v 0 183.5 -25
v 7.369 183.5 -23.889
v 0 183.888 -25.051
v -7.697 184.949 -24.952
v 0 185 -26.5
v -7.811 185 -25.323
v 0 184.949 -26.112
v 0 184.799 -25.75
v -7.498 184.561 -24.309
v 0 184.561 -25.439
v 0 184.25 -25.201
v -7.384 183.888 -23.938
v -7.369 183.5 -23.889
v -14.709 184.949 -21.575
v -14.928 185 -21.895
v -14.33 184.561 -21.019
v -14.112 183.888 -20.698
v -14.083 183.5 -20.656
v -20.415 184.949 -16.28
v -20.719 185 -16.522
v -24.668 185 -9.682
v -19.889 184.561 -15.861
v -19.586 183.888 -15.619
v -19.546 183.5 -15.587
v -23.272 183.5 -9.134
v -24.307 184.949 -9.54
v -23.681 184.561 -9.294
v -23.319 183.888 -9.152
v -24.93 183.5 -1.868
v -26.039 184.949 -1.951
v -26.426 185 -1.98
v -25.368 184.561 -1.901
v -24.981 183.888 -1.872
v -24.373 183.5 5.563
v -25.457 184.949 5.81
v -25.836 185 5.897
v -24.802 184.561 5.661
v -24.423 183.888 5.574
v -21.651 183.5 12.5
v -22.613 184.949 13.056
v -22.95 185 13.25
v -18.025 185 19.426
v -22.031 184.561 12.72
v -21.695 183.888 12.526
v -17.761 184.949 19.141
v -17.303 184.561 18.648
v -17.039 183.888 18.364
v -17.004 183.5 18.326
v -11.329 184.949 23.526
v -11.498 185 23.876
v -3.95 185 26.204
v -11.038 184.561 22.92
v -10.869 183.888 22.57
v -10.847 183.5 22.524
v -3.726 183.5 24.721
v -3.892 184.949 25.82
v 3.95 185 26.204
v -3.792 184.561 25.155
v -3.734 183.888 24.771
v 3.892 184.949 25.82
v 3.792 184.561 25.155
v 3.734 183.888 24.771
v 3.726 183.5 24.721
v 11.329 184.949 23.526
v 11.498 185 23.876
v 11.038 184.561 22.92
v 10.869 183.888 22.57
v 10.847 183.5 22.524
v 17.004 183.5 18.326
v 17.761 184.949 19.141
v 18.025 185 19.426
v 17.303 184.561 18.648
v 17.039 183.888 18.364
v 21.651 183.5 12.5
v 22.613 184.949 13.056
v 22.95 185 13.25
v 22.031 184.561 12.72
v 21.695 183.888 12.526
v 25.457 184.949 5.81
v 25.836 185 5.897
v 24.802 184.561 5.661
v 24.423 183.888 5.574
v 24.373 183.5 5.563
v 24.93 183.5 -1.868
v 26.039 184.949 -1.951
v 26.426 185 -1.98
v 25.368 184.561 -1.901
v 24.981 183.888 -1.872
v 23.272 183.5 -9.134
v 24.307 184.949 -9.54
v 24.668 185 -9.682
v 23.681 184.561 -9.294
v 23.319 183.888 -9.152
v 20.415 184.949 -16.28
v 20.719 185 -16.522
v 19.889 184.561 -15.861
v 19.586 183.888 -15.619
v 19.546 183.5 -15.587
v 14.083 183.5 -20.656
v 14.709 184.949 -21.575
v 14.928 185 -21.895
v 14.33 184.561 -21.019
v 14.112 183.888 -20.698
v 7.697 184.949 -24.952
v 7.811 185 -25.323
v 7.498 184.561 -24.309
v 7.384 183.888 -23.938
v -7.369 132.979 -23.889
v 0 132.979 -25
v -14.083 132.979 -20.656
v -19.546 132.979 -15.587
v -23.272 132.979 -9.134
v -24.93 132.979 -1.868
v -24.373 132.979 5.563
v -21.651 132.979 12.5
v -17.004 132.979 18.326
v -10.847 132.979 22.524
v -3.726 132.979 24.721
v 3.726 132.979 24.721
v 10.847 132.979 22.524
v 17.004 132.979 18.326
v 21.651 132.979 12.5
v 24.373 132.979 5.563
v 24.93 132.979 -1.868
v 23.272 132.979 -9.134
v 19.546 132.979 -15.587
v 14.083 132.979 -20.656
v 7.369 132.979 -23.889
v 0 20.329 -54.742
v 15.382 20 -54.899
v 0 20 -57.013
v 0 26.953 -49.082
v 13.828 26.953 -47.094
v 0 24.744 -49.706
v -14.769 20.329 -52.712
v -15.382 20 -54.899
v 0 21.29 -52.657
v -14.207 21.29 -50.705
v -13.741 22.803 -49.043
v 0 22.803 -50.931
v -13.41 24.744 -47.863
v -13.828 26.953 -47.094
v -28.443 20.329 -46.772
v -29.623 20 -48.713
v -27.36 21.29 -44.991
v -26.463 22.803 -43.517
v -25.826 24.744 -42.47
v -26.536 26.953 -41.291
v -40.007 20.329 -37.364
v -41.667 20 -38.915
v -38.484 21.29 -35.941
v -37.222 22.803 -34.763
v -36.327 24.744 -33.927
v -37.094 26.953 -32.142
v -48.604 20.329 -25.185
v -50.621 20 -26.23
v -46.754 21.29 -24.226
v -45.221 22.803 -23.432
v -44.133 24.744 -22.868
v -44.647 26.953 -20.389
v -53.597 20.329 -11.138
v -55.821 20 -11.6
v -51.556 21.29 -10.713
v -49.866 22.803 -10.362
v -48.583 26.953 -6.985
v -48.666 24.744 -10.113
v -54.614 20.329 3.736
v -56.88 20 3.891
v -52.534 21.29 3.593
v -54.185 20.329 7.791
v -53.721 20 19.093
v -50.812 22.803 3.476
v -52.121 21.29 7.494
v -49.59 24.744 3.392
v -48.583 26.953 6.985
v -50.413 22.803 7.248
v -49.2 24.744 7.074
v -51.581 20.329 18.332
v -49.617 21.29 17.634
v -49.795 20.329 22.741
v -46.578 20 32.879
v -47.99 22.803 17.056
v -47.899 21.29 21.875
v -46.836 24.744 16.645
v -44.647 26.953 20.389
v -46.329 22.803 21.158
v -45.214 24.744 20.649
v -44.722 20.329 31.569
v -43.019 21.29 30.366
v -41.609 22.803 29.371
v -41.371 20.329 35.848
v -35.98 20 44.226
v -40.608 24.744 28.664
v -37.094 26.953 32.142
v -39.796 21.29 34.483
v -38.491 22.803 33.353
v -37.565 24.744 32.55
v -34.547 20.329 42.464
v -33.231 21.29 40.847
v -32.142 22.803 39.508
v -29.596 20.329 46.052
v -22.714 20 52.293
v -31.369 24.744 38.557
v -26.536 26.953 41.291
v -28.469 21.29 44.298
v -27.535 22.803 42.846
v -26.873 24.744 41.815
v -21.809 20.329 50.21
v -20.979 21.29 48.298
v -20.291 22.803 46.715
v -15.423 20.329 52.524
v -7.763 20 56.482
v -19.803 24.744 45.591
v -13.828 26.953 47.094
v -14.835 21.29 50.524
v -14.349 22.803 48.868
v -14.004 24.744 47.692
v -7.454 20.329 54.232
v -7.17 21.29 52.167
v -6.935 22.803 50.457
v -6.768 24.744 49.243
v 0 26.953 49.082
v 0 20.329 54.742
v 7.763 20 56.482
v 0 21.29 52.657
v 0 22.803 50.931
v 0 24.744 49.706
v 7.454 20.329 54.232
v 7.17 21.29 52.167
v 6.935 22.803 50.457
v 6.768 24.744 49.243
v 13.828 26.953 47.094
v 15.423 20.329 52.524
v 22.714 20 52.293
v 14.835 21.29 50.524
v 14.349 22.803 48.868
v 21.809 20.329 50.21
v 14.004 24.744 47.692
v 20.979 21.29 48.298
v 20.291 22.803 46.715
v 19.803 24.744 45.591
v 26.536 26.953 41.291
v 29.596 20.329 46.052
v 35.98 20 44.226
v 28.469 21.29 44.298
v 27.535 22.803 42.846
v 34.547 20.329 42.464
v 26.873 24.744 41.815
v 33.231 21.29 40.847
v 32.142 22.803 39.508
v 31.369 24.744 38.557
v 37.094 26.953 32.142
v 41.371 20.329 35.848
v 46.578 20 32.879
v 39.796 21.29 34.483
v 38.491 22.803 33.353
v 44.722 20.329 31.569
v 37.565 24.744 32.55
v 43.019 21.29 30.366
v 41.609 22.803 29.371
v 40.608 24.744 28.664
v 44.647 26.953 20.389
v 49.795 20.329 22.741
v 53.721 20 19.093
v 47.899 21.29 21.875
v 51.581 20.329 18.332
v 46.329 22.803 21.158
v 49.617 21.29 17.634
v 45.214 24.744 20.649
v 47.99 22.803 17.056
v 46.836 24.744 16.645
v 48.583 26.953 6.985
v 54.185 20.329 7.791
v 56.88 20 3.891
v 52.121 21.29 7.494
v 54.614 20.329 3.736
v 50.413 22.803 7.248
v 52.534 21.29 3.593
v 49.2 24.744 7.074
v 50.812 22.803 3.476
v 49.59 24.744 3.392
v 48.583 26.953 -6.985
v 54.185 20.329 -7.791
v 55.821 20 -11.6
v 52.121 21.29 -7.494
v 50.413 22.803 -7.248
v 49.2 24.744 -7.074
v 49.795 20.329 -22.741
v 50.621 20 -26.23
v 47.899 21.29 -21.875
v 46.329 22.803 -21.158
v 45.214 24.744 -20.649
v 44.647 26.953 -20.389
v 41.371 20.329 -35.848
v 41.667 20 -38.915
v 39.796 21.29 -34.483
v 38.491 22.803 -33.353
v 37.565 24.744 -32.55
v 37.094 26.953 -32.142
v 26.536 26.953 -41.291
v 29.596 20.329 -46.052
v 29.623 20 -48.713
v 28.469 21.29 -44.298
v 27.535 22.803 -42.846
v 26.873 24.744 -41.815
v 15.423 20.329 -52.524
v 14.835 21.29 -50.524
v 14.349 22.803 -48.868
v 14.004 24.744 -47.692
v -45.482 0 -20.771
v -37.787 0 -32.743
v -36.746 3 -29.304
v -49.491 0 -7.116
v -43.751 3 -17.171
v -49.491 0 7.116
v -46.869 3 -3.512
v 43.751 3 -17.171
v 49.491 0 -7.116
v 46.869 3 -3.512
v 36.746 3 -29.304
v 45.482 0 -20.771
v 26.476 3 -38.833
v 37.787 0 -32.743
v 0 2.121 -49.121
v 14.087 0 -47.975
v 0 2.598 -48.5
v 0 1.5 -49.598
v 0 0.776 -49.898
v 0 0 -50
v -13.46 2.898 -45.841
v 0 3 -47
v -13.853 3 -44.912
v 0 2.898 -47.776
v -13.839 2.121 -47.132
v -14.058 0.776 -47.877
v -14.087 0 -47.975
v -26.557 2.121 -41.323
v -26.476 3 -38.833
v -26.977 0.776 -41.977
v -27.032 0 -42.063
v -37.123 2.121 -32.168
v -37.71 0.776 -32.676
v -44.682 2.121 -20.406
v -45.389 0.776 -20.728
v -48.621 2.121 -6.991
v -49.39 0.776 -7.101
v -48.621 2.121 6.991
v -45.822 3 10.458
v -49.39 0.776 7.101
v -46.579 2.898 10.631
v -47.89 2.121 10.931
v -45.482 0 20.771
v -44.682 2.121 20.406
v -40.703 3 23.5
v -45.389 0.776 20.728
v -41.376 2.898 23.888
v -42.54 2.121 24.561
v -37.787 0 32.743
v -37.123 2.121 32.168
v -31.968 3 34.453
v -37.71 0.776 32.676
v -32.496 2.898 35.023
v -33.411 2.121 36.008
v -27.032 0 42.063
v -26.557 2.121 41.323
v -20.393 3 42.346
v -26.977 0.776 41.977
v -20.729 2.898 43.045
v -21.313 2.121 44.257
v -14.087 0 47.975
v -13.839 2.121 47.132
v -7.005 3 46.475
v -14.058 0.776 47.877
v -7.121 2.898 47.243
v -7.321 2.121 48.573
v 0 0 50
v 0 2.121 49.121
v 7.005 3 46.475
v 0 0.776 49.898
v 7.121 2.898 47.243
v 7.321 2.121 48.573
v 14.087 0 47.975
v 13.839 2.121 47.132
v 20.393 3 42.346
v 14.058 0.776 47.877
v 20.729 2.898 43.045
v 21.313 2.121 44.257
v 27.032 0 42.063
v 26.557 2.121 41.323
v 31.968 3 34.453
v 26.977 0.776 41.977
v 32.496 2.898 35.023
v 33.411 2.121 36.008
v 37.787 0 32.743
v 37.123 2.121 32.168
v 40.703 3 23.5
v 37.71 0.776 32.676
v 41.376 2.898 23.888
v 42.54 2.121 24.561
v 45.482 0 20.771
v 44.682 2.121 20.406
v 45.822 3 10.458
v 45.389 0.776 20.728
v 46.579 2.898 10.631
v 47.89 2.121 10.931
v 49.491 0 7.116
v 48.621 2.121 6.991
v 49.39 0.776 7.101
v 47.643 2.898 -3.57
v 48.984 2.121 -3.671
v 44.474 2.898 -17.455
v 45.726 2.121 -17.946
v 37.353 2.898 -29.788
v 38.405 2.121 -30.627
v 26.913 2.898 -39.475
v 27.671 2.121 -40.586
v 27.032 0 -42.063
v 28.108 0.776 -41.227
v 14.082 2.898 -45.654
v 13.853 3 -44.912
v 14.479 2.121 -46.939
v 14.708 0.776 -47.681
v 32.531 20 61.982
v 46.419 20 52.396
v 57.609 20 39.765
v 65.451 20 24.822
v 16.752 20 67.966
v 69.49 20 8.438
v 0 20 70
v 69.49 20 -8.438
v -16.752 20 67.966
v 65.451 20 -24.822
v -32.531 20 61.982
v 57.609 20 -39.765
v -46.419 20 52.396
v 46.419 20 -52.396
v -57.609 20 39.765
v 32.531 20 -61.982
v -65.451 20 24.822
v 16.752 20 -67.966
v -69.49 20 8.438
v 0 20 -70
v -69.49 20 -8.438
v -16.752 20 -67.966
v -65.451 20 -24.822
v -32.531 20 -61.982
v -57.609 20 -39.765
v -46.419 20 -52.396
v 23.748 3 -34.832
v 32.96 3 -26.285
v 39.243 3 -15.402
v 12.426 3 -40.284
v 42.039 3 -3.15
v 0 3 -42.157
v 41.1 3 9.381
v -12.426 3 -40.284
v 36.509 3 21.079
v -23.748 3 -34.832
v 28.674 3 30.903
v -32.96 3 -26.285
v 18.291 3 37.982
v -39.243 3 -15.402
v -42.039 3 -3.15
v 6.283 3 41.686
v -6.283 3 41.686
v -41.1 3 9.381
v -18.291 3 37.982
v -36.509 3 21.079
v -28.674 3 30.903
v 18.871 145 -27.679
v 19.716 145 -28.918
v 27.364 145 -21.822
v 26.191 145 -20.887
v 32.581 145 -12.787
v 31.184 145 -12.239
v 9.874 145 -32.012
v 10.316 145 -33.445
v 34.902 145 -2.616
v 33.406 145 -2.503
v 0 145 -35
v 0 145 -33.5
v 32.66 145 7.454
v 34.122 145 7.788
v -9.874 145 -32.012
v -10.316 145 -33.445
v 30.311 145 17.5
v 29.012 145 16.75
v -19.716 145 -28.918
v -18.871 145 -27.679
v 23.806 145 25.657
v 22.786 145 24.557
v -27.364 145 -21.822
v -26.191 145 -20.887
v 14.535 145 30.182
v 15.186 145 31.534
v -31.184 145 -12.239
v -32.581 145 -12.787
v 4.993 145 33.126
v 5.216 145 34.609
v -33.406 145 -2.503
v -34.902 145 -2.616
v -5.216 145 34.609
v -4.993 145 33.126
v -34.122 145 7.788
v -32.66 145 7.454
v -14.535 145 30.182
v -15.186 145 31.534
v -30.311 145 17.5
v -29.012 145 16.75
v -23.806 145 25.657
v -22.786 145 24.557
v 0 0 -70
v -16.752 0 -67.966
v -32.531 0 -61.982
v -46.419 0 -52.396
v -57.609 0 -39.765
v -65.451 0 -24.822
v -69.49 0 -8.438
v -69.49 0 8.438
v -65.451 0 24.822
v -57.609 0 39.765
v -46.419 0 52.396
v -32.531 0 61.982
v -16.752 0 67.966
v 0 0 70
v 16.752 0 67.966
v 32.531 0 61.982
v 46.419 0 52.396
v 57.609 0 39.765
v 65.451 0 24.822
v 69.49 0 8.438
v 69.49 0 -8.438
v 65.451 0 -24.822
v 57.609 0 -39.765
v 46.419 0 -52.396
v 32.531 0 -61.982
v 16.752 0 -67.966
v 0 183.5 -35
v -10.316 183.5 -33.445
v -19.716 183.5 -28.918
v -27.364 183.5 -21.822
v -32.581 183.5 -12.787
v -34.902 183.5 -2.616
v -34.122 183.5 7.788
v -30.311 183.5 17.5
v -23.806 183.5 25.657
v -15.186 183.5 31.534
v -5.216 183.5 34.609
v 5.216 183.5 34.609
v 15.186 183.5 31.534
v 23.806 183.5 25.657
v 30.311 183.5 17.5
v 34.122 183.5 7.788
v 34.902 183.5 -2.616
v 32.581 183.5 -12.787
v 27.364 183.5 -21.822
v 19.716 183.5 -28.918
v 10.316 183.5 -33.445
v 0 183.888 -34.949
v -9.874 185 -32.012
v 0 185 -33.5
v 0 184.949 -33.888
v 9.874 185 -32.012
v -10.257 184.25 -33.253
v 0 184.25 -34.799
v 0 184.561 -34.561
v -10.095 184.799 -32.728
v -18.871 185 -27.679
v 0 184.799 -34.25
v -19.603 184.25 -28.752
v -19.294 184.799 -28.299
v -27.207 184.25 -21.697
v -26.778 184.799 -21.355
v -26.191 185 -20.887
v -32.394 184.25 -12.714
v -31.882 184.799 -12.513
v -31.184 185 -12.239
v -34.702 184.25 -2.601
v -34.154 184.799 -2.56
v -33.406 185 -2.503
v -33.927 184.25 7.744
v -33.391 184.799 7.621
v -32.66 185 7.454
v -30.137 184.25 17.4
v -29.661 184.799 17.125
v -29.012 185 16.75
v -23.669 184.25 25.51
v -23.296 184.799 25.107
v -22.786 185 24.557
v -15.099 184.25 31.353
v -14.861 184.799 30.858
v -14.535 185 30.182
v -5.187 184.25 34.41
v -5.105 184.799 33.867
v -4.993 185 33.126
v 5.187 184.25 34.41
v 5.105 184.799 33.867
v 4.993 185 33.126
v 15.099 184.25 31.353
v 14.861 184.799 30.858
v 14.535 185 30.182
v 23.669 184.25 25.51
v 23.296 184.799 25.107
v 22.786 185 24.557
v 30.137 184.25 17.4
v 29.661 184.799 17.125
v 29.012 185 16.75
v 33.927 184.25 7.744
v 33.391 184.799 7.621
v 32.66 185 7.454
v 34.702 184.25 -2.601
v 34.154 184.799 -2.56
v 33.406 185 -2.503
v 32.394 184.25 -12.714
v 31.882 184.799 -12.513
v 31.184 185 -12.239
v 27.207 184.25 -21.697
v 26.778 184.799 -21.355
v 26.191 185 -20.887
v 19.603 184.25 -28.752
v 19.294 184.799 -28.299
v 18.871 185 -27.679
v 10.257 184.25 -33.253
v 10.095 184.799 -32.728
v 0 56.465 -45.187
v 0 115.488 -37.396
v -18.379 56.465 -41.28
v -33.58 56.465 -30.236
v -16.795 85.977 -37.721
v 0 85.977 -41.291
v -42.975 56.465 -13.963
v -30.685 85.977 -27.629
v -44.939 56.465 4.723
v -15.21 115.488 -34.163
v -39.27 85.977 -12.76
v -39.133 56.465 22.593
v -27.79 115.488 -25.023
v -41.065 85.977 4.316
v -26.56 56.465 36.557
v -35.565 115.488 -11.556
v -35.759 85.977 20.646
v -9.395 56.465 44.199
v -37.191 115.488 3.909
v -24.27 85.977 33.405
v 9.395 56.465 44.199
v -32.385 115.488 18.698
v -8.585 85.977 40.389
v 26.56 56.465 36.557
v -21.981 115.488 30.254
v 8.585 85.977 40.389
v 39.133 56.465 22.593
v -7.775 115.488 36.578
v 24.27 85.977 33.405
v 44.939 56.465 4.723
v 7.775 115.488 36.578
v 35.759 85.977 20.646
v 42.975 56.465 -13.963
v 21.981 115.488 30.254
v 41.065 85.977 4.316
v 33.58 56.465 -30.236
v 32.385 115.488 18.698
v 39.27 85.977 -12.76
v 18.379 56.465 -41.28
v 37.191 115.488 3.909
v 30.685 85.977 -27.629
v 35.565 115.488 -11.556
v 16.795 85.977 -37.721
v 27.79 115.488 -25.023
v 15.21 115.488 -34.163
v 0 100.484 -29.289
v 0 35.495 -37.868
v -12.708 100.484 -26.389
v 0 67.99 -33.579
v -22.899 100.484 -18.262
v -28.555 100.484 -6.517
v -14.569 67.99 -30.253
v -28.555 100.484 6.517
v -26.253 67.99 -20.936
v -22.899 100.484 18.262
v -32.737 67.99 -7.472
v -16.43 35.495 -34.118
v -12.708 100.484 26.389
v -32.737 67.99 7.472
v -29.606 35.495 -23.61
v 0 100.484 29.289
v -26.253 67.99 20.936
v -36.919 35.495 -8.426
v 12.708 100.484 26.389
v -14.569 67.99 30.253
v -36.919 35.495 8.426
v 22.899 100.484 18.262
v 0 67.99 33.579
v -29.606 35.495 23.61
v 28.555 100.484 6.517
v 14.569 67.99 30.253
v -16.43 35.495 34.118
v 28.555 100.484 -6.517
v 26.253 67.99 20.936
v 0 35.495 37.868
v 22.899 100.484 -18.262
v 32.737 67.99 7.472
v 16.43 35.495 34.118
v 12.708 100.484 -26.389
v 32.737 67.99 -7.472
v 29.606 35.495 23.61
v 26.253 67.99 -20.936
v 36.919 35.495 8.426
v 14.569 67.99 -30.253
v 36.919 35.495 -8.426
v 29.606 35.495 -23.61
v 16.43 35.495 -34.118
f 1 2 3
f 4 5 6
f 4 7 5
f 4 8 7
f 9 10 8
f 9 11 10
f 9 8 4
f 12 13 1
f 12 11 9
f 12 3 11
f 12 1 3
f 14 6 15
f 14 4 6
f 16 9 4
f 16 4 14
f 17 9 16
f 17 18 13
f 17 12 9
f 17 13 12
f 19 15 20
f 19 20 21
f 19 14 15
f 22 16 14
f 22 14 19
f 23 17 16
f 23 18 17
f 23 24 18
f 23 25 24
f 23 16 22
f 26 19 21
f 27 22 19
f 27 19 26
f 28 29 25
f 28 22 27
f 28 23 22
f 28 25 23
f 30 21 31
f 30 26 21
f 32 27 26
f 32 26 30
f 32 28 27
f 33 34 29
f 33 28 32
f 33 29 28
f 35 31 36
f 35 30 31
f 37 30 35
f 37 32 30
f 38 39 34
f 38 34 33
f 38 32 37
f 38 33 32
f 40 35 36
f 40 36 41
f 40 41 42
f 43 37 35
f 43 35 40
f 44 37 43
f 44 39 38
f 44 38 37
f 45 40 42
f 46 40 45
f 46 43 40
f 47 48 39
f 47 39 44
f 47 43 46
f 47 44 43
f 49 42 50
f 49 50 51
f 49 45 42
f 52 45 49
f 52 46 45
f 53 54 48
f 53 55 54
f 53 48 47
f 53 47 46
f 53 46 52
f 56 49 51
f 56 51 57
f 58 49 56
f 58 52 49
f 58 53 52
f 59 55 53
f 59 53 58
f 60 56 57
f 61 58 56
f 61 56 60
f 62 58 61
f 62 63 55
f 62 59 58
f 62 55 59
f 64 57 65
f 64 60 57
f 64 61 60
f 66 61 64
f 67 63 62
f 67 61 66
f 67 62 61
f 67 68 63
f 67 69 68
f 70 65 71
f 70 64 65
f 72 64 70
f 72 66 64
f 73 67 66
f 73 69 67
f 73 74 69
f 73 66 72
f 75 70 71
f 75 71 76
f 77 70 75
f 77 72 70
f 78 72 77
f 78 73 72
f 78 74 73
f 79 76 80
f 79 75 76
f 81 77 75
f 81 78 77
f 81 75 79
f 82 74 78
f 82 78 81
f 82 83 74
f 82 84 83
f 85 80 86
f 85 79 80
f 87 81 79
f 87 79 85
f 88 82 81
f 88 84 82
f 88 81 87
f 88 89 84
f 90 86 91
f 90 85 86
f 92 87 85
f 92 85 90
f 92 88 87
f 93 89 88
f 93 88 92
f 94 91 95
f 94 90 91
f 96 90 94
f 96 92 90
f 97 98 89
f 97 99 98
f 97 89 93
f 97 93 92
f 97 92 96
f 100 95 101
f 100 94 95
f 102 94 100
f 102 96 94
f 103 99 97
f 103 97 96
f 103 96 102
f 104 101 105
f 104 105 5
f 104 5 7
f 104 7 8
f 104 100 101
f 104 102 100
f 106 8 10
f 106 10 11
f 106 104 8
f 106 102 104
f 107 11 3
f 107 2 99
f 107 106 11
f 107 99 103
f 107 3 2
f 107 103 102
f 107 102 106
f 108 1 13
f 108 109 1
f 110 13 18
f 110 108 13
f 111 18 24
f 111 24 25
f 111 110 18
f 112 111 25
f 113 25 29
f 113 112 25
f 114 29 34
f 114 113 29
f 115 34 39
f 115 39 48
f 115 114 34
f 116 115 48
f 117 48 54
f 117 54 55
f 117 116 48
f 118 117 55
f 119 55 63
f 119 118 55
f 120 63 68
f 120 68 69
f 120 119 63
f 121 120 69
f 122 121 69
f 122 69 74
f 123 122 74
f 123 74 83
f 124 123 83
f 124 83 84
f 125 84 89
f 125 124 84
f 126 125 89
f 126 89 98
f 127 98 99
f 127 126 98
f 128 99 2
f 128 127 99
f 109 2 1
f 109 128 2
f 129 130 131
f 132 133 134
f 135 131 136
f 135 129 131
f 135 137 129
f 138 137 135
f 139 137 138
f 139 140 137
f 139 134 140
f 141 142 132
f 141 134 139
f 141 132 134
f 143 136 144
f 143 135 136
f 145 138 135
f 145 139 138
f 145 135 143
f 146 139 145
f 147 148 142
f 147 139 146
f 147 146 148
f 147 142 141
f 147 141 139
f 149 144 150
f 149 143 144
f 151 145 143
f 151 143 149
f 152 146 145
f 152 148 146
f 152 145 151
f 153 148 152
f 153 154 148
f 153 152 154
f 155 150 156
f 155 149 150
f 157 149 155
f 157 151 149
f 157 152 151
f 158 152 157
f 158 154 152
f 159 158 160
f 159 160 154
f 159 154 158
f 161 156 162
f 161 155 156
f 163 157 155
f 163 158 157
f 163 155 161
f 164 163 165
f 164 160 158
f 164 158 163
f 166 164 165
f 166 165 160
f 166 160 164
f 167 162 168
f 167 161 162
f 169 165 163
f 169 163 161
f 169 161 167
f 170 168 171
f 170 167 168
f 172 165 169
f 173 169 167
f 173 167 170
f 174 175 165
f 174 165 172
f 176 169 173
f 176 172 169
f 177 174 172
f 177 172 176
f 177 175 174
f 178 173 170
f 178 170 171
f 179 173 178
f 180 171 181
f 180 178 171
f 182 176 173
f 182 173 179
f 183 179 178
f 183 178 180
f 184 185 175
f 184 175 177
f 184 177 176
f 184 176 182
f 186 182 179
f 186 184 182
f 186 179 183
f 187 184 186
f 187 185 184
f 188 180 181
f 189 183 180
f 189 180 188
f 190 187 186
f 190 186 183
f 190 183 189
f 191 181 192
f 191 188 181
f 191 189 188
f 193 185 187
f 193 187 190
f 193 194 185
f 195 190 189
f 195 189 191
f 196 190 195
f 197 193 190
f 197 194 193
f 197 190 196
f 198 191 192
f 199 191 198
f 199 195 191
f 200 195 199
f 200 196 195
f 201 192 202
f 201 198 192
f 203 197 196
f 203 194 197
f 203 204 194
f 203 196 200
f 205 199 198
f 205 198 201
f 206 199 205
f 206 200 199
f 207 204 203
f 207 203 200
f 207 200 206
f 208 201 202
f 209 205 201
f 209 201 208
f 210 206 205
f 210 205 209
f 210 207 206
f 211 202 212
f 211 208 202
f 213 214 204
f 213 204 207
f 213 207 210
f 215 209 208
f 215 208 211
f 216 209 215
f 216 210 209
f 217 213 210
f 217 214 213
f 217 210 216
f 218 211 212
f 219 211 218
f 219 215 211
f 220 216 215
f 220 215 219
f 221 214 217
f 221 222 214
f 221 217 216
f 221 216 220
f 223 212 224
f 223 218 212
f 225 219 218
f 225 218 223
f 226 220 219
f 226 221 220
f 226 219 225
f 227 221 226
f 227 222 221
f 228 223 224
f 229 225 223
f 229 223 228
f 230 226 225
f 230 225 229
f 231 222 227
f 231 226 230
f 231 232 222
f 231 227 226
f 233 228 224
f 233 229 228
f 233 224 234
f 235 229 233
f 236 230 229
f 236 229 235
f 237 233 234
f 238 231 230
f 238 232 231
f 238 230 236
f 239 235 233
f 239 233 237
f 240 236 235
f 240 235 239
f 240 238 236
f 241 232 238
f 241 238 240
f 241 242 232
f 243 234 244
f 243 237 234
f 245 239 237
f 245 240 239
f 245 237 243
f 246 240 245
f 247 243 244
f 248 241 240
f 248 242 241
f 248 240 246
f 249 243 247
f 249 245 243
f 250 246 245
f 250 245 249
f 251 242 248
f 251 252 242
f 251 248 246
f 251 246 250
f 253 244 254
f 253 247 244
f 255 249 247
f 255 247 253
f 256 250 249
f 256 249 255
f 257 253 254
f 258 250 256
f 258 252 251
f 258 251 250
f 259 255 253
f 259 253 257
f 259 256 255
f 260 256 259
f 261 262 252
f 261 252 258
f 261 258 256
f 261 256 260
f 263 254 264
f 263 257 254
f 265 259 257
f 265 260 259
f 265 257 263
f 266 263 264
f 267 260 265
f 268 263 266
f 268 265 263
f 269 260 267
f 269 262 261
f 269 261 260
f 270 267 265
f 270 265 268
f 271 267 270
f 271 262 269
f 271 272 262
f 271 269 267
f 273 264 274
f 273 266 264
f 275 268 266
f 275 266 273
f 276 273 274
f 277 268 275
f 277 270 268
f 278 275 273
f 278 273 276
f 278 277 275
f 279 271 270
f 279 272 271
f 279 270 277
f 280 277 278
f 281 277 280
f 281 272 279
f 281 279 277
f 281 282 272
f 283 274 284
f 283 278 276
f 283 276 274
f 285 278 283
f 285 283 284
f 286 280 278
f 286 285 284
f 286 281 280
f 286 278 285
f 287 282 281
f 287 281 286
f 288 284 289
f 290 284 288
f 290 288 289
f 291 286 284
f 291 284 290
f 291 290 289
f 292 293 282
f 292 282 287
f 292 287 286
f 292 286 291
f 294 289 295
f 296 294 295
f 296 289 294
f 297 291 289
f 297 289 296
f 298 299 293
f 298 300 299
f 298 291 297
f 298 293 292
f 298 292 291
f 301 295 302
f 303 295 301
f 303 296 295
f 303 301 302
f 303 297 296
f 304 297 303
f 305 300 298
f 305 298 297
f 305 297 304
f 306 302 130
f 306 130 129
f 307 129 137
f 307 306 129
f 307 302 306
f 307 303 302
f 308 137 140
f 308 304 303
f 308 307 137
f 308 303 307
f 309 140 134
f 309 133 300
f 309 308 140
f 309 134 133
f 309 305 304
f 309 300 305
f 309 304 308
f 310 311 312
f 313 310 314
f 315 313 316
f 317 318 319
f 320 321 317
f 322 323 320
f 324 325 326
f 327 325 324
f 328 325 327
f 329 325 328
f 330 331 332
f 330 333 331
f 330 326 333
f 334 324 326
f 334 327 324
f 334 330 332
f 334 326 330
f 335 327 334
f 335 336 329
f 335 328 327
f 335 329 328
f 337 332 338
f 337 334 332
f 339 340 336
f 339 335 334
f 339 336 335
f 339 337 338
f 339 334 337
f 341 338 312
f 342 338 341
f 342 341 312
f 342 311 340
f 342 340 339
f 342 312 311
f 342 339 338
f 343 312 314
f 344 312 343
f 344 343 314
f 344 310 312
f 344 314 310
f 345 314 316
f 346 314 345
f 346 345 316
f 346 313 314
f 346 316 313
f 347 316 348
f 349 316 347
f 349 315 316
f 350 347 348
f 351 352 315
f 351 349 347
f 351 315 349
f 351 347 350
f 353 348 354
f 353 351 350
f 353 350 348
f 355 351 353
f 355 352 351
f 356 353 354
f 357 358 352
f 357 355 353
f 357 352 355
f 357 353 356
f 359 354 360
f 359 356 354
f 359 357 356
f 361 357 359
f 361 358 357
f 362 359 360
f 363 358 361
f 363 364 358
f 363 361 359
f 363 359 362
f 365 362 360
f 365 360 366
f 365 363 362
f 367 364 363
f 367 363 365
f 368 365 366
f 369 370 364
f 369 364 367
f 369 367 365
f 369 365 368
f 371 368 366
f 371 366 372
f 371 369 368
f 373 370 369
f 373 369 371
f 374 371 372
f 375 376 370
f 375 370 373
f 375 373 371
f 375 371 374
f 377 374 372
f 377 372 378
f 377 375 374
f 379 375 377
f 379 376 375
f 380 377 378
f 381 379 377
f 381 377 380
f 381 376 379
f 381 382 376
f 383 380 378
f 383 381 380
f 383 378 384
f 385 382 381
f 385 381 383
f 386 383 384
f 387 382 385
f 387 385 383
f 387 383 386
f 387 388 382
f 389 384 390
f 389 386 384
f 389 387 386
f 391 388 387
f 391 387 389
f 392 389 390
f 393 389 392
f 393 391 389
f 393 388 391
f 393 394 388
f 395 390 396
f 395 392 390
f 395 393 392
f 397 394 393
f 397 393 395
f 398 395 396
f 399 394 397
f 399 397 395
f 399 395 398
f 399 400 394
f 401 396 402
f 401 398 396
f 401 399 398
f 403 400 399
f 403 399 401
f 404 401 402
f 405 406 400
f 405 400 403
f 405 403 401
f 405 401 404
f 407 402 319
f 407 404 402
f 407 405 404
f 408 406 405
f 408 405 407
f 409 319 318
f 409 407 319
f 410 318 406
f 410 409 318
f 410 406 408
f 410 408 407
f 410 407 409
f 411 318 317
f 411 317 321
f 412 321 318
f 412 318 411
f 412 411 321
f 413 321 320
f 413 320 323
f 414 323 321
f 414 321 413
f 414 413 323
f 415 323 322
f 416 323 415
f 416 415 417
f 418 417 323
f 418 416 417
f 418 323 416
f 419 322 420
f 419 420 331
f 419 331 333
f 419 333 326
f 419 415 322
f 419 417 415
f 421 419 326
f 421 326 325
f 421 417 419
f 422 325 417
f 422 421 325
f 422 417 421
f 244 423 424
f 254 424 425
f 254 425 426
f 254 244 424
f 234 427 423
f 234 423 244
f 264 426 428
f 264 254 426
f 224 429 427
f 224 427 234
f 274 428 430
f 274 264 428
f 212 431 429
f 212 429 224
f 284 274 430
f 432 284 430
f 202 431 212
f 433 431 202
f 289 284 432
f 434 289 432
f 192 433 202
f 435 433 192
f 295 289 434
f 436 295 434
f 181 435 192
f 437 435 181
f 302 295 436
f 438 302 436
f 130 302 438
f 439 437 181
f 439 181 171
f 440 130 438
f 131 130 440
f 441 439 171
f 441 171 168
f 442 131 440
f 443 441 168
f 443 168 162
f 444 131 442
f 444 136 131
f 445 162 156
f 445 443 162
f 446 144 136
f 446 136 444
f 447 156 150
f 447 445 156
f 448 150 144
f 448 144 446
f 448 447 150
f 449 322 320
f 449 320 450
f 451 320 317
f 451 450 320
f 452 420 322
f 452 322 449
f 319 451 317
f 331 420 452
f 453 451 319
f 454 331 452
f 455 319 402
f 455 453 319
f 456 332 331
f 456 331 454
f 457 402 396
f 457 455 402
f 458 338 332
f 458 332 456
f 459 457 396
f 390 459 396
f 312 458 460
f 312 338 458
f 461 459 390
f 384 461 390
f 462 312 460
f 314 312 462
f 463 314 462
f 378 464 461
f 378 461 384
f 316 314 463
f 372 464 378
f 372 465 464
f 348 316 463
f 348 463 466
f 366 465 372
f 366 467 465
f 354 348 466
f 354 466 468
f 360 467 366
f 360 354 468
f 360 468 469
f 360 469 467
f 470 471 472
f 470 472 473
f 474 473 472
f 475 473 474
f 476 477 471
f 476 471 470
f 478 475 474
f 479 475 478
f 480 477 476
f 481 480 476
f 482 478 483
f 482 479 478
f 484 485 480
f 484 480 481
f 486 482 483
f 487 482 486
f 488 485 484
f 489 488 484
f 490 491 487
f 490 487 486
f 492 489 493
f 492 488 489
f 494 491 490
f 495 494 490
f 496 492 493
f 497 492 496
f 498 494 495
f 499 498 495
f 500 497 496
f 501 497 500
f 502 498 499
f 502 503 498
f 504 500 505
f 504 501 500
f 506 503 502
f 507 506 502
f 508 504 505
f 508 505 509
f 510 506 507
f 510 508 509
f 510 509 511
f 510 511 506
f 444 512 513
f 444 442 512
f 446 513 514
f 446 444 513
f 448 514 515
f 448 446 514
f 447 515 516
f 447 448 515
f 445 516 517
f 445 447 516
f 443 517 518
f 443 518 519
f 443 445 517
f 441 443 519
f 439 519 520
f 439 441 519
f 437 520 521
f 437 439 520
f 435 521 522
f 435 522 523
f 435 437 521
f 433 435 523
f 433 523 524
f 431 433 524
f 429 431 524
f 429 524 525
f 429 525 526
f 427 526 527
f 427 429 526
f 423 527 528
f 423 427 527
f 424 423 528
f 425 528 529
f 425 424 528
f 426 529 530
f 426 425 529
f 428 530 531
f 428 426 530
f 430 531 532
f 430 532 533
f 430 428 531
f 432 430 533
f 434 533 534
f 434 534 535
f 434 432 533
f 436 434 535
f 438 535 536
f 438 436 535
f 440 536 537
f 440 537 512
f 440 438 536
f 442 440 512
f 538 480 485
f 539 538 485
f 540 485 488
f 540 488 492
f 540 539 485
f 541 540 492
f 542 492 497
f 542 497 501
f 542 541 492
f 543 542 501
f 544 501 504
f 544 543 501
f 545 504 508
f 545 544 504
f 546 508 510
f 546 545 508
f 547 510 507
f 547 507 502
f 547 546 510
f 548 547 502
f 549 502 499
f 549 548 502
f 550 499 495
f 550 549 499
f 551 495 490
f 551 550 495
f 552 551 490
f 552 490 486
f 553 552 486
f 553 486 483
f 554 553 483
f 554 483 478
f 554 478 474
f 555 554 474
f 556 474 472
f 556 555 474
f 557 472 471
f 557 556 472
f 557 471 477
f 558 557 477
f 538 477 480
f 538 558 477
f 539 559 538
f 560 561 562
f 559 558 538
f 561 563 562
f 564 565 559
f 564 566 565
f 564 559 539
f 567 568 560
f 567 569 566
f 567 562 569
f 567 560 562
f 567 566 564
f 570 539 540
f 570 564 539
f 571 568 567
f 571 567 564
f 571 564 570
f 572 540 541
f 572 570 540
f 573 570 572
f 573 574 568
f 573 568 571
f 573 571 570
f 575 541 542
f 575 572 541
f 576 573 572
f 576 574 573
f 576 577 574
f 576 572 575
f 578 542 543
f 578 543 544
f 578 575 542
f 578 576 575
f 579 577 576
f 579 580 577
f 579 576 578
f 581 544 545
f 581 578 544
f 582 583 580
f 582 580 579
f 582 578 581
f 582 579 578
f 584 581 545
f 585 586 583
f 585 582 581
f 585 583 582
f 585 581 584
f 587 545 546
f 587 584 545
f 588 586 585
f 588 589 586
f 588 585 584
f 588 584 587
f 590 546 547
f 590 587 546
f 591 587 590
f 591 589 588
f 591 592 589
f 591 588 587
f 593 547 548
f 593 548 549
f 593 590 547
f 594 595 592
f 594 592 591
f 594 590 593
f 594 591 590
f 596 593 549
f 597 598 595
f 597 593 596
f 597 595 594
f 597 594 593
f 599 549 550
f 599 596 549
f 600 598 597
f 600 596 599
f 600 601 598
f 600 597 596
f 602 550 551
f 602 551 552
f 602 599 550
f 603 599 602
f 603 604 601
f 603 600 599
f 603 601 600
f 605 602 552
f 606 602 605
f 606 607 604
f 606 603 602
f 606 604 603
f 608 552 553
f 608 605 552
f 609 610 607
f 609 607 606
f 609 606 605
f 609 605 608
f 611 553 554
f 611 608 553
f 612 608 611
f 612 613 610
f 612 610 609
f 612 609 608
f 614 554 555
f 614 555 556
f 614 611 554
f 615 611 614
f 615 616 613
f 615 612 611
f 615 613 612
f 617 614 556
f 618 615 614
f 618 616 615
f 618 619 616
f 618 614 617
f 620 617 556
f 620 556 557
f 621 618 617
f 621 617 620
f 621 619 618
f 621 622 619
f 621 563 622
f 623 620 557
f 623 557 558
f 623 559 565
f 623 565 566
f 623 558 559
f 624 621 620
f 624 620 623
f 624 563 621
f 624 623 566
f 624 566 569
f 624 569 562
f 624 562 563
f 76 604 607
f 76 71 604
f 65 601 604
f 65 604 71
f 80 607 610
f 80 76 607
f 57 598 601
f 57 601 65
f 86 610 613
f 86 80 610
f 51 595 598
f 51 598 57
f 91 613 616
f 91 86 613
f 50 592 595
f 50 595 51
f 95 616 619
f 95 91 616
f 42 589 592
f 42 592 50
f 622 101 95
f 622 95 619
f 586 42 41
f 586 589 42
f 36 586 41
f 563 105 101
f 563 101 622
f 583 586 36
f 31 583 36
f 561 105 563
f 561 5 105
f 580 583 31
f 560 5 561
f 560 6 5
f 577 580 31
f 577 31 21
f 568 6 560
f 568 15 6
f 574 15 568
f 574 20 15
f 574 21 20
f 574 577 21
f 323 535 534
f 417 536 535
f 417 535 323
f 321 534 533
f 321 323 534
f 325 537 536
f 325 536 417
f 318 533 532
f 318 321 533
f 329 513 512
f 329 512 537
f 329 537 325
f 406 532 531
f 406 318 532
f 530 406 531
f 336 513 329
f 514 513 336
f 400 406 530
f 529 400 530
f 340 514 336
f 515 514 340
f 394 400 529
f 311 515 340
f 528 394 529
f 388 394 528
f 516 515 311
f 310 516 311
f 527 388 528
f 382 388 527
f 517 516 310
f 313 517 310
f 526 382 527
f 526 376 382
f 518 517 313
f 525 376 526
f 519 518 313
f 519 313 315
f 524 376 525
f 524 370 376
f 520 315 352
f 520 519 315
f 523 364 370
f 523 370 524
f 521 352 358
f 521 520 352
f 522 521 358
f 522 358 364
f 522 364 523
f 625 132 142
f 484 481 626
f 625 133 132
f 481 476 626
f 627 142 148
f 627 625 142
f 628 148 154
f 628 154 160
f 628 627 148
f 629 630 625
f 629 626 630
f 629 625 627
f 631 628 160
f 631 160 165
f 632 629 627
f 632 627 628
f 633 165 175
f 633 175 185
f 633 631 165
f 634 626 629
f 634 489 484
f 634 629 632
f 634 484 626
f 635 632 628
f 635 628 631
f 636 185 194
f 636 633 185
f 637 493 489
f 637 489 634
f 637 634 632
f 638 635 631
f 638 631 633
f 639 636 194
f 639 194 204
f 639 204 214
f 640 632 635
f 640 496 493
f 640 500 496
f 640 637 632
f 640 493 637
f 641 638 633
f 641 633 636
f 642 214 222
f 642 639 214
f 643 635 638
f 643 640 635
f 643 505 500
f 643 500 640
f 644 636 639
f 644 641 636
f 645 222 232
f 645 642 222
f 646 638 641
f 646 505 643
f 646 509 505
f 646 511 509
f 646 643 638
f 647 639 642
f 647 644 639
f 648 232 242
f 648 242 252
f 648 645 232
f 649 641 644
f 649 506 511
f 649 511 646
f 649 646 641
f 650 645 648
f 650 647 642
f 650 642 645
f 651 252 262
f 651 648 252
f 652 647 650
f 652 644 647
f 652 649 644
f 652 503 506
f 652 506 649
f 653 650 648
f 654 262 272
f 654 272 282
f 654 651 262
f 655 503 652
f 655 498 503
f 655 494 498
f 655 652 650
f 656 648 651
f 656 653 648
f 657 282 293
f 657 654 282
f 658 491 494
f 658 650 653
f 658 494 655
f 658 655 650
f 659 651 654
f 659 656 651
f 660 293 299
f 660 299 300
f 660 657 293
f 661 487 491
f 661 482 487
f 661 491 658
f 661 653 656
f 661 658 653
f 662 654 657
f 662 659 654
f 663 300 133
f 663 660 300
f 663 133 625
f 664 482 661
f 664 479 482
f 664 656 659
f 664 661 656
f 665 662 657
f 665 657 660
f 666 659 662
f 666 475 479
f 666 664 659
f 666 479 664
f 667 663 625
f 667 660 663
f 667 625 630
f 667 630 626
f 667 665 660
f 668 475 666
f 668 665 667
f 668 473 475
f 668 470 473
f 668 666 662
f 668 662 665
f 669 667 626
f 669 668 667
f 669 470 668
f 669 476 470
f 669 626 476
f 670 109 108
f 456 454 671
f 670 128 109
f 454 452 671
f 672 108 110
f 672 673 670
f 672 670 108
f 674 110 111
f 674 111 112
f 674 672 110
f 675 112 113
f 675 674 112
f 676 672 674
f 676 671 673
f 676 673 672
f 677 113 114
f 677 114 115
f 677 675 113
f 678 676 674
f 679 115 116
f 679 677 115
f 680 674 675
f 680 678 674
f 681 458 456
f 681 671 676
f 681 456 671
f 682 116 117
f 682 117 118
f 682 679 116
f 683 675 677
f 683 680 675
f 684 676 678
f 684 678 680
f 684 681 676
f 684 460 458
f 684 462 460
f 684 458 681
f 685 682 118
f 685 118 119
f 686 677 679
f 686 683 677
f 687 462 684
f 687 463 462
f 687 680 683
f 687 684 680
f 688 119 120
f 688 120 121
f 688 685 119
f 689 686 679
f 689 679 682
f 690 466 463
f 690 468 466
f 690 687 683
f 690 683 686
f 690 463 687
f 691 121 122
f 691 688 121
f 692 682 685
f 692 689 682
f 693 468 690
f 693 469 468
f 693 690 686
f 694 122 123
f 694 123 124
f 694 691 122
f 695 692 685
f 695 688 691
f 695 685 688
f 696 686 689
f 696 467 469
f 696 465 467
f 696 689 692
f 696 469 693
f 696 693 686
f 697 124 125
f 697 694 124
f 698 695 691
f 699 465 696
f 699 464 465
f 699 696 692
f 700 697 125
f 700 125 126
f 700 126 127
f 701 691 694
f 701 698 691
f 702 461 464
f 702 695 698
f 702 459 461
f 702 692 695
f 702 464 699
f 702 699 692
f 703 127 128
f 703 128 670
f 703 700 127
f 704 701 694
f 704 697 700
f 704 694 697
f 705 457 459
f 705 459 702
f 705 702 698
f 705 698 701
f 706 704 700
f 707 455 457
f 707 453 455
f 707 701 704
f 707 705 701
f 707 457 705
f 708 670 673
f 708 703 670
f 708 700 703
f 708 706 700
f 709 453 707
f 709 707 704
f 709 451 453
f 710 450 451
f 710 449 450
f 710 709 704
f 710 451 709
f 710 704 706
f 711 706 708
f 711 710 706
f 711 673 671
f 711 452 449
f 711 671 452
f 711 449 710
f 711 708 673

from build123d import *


with BuildPart() as part:
    # Sketch2 → 01_Body (revolve)
    with BuildSketch(Plane.XY, mode=Mode.PRIVATE) as f_01_body_sk:
        with BuildLine():
            Line((70, 0), (70, 20))
            Line((70, 20), (57.013395021, 20))
            ThreePointArc((57.013395021, 20), (51.73965579, 21.984380786), (49.082193259, 26.953081368))
            Line((49.082193259, 26.953081368), (33.5, 145))
            Line((33.5, 145), (35, 145))
            Line((35, 145), (35, 183.5))
            ThreePointArc((35, 183.5), (34.560660172, 184.560660172), (33.5, 185))
            Line((33.5, 185), (26.5, 185))
            ThreePointArc((26.5, 185), (25.439339828, 184.560660172), (25, 183.5))
            Line((25, 183.5), (25, 132.979213819))
            Line((25, 132.979213819), (42.157256224, 3))
            Line((42.157256224, 3), (47, 3))
            ThreePointArc((47, 3), (49.121320344, 2.121320344), (50, 0))
            Line((50, 0), (70, 0))
        make_face()
    revolve(f_01_body_sk.sketch.rotate(Axis((0, 0, 0), (0, 1, 0)), 90), axis=Axis((0, 0, 0), (0, 1, 0)))


solid = part.part
